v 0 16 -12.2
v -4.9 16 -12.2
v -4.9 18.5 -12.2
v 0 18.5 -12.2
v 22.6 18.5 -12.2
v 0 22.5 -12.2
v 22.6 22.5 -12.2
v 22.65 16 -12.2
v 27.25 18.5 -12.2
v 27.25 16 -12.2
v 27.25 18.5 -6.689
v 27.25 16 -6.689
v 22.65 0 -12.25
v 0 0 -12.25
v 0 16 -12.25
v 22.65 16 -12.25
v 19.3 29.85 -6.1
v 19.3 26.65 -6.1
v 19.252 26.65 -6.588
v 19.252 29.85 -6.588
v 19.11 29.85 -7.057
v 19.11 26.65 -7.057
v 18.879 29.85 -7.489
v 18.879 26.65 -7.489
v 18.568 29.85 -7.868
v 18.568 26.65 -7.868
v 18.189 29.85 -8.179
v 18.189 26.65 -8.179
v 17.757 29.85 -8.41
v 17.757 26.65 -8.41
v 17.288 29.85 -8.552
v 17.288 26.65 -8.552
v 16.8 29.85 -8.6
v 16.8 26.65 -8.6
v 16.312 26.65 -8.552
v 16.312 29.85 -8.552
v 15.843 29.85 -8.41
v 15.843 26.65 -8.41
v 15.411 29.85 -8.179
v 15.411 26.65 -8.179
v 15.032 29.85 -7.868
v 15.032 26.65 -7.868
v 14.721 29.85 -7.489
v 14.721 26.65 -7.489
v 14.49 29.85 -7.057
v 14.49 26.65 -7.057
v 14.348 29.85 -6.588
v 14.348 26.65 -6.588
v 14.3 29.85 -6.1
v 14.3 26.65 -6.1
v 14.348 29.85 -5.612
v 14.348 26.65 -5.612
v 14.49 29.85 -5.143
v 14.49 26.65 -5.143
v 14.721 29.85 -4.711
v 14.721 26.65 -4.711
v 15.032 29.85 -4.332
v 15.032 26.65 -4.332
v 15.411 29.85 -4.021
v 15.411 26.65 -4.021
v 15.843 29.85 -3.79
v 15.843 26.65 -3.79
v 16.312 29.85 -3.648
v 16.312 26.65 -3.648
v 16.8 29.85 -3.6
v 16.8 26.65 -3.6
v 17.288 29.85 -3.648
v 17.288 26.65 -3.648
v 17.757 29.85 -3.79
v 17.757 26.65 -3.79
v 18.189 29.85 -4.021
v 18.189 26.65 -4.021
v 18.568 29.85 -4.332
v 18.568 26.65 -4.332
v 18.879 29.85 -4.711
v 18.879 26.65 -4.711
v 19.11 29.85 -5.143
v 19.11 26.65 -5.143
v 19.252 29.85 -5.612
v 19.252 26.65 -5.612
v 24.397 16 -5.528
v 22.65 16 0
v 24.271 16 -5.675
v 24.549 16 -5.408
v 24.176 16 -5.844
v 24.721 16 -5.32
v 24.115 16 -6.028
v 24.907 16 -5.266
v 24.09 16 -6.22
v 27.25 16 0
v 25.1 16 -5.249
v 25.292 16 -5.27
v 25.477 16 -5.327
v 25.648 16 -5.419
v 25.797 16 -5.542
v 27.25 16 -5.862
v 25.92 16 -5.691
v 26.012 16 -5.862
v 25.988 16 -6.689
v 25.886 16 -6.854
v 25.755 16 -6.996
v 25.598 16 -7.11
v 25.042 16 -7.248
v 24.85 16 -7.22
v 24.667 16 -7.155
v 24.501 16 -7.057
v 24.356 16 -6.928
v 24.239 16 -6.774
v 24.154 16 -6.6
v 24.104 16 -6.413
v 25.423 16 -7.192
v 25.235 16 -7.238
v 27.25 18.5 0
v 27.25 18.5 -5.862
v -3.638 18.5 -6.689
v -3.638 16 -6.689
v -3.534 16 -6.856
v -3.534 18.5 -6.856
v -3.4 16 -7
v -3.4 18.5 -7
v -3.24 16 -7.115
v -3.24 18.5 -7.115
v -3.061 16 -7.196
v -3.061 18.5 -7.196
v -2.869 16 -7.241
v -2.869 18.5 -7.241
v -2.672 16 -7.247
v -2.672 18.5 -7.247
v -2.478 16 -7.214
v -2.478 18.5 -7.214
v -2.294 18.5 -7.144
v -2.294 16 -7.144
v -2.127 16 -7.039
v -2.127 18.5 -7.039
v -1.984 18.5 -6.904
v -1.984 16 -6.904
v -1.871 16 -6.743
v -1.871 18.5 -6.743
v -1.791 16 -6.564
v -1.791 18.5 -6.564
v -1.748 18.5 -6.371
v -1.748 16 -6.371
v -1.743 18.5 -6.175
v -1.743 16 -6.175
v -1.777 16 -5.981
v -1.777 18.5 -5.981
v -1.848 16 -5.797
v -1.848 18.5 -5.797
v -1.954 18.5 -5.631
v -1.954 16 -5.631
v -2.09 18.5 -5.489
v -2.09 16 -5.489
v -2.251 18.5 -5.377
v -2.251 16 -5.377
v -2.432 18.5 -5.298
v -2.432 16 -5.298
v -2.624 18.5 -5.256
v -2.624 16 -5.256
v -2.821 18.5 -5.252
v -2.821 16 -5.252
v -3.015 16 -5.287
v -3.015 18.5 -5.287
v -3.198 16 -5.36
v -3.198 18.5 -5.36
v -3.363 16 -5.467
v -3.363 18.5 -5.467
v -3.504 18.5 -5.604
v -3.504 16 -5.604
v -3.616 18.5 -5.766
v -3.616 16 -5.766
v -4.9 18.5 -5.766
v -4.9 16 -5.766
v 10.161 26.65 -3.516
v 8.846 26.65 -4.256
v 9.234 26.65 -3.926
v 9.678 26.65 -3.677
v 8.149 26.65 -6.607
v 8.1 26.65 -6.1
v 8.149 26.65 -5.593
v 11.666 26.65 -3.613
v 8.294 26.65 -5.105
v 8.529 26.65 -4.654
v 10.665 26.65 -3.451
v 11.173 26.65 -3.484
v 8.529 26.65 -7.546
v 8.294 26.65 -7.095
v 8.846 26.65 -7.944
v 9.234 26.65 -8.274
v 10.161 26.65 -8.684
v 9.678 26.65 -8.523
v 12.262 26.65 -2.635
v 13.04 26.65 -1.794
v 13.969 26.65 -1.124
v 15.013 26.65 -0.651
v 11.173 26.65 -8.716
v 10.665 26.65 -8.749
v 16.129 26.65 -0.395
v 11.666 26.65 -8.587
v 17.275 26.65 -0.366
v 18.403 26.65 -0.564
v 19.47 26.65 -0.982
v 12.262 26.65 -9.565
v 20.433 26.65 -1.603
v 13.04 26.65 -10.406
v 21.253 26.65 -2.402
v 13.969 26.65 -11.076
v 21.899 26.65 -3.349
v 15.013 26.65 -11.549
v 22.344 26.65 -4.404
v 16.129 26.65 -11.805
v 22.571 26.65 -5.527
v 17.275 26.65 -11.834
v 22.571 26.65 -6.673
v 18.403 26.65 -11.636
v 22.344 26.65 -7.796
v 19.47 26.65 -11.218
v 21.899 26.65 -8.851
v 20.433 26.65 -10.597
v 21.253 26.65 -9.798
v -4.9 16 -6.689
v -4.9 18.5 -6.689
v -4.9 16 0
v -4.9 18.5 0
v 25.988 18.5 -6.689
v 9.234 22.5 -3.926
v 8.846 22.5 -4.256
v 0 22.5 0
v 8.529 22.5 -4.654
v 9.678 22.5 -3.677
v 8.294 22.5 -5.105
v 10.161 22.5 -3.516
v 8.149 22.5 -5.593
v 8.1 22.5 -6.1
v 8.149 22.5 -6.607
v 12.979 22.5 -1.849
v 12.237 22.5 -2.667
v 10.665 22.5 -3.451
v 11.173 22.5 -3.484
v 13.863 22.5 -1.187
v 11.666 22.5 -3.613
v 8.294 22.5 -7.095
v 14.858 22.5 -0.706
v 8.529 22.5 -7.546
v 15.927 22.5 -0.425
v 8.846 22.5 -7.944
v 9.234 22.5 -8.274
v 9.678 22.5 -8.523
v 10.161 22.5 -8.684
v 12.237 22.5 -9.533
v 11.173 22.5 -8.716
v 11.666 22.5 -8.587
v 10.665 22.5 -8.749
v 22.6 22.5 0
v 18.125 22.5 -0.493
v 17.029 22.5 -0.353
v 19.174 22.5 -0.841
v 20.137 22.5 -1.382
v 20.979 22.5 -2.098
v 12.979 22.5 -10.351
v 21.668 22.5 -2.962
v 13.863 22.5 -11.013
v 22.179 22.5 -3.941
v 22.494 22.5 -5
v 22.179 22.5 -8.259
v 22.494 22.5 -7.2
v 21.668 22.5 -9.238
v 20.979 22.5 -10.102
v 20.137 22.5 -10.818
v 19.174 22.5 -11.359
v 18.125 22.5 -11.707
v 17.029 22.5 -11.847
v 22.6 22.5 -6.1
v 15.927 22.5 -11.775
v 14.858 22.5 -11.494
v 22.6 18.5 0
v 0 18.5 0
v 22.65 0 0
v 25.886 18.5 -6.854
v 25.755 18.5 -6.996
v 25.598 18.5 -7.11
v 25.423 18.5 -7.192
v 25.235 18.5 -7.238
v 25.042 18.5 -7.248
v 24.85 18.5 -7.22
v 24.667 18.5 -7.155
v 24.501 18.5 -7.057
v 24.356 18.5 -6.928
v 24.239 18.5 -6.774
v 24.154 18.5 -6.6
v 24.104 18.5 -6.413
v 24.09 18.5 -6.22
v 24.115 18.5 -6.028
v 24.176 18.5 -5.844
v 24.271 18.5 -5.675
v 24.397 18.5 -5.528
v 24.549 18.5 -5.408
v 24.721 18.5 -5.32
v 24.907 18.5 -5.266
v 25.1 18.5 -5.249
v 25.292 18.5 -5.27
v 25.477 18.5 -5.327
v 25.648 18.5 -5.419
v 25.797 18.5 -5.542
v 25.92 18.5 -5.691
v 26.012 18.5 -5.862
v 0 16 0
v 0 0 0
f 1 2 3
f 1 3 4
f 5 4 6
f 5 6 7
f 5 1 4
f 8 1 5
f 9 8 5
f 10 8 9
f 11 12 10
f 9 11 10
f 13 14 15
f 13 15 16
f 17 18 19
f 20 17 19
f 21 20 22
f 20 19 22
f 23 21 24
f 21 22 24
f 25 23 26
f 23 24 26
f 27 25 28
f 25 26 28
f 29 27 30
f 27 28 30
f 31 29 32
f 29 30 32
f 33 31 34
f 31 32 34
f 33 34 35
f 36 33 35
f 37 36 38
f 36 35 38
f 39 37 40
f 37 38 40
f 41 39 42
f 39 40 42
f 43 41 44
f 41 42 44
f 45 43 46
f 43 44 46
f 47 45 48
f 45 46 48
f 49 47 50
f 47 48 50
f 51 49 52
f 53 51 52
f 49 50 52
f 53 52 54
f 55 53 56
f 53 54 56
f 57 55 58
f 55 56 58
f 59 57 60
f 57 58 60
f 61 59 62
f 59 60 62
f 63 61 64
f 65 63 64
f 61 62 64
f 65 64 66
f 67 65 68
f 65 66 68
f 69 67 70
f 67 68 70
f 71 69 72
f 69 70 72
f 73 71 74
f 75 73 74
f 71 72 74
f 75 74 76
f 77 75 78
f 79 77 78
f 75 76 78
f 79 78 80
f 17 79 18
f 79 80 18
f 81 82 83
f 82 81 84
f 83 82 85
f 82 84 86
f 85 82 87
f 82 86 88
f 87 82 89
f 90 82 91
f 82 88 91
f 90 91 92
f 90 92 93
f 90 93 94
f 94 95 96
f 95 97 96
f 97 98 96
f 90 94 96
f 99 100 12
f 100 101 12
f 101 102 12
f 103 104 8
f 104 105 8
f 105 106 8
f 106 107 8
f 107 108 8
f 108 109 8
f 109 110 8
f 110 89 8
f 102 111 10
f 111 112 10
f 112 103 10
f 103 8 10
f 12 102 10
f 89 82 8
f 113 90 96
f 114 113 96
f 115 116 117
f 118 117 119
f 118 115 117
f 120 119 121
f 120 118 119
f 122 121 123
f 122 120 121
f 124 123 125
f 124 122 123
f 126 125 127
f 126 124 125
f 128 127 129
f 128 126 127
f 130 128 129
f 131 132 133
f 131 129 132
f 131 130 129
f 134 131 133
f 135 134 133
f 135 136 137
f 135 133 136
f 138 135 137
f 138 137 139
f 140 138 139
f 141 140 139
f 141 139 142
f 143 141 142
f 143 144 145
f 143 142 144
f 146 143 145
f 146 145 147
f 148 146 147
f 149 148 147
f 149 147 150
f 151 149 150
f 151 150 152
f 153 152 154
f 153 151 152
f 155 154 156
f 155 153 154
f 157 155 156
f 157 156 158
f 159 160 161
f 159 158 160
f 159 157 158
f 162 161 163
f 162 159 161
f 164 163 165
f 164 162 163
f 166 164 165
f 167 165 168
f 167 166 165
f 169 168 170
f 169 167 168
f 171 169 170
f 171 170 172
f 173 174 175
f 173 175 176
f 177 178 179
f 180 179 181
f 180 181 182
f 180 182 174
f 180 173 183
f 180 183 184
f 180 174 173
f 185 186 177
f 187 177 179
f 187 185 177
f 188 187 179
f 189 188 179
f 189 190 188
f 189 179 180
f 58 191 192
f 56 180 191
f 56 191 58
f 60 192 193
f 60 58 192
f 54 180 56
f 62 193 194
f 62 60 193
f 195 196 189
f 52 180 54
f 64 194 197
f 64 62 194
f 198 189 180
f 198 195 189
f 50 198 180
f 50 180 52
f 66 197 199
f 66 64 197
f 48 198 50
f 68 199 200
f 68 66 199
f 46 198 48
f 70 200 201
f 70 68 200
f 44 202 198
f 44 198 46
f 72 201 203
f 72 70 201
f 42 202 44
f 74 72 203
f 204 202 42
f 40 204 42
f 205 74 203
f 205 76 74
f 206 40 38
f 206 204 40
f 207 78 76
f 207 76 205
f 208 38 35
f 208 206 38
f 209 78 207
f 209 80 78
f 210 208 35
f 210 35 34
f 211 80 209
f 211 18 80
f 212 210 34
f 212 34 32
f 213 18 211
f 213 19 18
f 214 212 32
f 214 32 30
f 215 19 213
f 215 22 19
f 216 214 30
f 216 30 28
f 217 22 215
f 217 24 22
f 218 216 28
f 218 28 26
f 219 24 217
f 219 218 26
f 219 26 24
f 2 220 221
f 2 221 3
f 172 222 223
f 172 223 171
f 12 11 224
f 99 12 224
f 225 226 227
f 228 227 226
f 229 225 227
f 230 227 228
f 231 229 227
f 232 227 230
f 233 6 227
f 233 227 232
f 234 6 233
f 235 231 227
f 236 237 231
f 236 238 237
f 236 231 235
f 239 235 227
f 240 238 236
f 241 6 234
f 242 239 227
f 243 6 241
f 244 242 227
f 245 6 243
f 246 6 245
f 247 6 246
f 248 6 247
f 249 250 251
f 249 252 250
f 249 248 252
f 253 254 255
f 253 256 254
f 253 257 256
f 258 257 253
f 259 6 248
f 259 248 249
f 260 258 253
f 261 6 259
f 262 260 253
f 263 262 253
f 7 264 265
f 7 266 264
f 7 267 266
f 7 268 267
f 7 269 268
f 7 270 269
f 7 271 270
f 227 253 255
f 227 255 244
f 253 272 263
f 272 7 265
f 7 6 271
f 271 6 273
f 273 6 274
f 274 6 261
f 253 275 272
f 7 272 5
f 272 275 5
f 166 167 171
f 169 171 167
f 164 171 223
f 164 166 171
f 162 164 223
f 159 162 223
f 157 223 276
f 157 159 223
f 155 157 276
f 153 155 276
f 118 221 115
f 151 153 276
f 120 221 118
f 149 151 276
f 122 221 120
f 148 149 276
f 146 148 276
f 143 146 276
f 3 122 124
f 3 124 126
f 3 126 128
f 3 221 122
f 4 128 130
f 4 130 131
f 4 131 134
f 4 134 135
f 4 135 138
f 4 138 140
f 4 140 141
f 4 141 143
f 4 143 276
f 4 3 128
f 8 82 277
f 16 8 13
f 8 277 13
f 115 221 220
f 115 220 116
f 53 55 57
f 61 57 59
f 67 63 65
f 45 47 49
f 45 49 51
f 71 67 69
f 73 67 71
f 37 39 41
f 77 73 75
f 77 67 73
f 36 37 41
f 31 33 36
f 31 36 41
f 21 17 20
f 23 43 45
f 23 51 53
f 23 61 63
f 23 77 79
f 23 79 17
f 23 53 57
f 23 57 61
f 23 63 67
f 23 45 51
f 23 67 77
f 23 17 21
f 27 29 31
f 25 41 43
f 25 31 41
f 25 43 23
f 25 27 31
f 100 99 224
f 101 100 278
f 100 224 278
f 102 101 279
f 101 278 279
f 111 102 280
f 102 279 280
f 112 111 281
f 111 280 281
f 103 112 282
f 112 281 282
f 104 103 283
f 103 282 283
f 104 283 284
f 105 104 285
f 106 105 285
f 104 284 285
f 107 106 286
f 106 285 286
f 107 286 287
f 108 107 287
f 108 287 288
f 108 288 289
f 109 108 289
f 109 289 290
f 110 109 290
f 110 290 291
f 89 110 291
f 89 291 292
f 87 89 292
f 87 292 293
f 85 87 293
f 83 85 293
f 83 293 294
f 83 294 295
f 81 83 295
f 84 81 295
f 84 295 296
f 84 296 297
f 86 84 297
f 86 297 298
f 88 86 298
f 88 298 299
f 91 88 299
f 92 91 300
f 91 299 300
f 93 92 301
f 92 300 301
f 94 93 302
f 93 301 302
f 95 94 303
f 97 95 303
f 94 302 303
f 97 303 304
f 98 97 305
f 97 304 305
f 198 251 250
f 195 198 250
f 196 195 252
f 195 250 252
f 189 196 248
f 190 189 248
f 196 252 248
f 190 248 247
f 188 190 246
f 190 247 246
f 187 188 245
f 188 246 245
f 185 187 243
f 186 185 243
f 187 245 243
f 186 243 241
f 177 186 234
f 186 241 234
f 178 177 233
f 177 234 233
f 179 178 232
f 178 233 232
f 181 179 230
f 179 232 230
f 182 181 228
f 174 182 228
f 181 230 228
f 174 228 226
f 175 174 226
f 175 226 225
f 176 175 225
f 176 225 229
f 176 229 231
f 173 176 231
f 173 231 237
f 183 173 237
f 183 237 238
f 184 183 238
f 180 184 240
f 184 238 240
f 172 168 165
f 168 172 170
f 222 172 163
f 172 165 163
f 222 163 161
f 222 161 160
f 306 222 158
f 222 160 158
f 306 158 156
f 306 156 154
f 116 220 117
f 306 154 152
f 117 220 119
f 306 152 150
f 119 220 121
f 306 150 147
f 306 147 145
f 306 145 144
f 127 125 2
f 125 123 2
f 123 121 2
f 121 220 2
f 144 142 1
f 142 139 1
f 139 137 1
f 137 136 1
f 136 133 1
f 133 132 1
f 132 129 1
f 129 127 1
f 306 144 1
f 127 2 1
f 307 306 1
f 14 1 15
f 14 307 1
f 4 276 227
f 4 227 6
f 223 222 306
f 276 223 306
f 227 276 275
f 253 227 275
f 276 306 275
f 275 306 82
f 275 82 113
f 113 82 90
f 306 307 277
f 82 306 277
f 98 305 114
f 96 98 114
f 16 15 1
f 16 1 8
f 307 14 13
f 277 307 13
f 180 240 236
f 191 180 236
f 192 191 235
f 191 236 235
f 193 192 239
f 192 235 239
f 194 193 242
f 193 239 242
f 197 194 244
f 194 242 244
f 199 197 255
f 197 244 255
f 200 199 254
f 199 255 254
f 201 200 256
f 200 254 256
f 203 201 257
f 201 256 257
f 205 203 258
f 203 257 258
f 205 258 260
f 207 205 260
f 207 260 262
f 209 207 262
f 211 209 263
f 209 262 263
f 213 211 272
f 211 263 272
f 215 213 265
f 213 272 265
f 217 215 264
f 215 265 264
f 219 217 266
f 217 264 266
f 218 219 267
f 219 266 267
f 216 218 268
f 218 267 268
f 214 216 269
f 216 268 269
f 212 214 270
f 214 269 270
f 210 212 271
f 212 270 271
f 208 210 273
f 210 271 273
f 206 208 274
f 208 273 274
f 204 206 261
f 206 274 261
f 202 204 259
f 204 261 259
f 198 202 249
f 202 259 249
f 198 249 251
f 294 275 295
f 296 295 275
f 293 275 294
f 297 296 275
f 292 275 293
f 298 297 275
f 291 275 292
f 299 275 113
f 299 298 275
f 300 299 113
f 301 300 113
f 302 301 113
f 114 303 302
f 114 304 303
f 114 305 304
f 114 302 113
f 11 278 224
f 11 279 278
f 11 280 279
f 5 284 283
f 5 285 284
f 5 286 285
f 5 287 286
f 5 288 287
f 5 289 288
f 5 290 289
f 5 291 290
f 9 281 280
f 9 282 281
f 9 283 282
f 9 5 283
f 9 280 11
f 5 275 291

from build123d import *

# Parameters (mm, degrees)
SKETCH1_W           = 22.65
SKETCH1_H           = 12.25
BOSS_EXTRUDE1_DEPTH = 16
SKETCH2_W           = 32.15
SKETCH2_H           = 12.2
BOSS_EXTRUDE2_DEPTH = 2.5
SKETCH3_W           = 22.6
SKETCH3_H           = 12.2
BOSS_EXTRUDE3_DEPTH = 4
BOSS_EXTRUDE4_DEPTH = 4.15
SKETCH5_R           = 2.5
BOSS_EXTRUDE5_DEPTH = 3.2
CUT_EXTRUDE1_DEPTH  = 19.5


with BuildPart() as part:
    # Sketch1 → Boss-Extrude1 (new body)
    with BuildSketch(Plane(origin=(0, 0, 0), x_dir=(1, 0, 0), z_dir=(0, 1, 0))):
        with Locations((11.325, 6.125)):
            Rectangle(SKETCH1_W, SKETCH1_H)
    extrude(amount=BOSS_EXTRUDE1_DEPTH)

    # Sketch2 → Boss-Extrude2 (add)
    with BuildSketch(Plane(origin=(0, 16, 0), x_dir=(1, 0, 0), z_dir=(0, 1, 0))):
        with Locations((11.175, 6.1)):
            Rectangle(SKETCH2_W, SKETCH2_H)
    extrude(amount=BOSS_EXTRUDE2_DEPTH)

    # Sketch3 → Boss-Extrude3 (add)
    with BuildSketch(Plane(origin=(0, 18.5, 0), x_dir=(1, 0, 0), z_dir=(0, 1, 0))):
        with Locations((11.3, 6.1)):
            Rectangle(SKETCH3_W, SKETCH3_H)
    extrude(amount=BOSS_EXTRUDE3_DEPTH)

    # Sketch4 → Boss-Extrude4 (add)
    with BuildSketch(Plane(origin=(0, 22.5, 0), x_dir=(1, 0, 0), z_dir=(0, 1, 0))):
        with BuildLine():
            ThreePointArc((11.66557377, 3.61318986), (22.6, 6.1), (11.66557377, 8.58681014))
            ThreePointArc((11.66557377, 8.58681014), (8.1, 6.1), (11.66557377, 3.61318986))
        make_face()
    extrude(amount=BOSS_EXTRUDE4_DEPTH)

    # Sketch5 → Boss-Extrude5 (add)
    with BuildSketch(Plane(origin=(0, 26.65, 0), x_dir=(1, 0, 0), z_dir=(0, 1, 0))):
        with Locations((16.8, 6.1)):
            Circle(SKETCH5_R)
    extrude(amount=BOSS_EXTRUDE5_DEPTH)

    # Sketch6 → Cut-Extrude1 (cut, through all)
    with BuildSketch(Plane(origin=(0, 18.5, 0), x_dir=(1, 0, 0), z_dir=(0, 1, 0))):
        with BuildLine():
            Line((-3.615686095, 5.766143081), (-4.9, 5.766143081))
            Line((-4.9, 5.766143081), (-4.9, 6.689056169))
            Line((-4.9, 6.689056169), (-3.63798195, 6.689056169))
            ThreePointArc((-3.63798195, 6.689056169), (-1.74029168, 6.273174961), (-3.615686095, 5.766143081))
        make_face()
        with BuildLine():
            Line((26.012019834, 5.861881235), (27.25, 5.861881235))
            Line((27.25, 5.861881235), (27.25, 6.689056169))
            Line((27.25, 6.689056169), (25.98798195, 6.689056169))
            ThreePointArc((25.98798195, 6.689056169), (24.090421981, 6.219975921), (26.012019834, 5.861881235))
        make_face()
    extrude(amount=-CUT_EXTRUDE1_DEPTH, mode=Mode.SUBTRACT)


solid = part.part
